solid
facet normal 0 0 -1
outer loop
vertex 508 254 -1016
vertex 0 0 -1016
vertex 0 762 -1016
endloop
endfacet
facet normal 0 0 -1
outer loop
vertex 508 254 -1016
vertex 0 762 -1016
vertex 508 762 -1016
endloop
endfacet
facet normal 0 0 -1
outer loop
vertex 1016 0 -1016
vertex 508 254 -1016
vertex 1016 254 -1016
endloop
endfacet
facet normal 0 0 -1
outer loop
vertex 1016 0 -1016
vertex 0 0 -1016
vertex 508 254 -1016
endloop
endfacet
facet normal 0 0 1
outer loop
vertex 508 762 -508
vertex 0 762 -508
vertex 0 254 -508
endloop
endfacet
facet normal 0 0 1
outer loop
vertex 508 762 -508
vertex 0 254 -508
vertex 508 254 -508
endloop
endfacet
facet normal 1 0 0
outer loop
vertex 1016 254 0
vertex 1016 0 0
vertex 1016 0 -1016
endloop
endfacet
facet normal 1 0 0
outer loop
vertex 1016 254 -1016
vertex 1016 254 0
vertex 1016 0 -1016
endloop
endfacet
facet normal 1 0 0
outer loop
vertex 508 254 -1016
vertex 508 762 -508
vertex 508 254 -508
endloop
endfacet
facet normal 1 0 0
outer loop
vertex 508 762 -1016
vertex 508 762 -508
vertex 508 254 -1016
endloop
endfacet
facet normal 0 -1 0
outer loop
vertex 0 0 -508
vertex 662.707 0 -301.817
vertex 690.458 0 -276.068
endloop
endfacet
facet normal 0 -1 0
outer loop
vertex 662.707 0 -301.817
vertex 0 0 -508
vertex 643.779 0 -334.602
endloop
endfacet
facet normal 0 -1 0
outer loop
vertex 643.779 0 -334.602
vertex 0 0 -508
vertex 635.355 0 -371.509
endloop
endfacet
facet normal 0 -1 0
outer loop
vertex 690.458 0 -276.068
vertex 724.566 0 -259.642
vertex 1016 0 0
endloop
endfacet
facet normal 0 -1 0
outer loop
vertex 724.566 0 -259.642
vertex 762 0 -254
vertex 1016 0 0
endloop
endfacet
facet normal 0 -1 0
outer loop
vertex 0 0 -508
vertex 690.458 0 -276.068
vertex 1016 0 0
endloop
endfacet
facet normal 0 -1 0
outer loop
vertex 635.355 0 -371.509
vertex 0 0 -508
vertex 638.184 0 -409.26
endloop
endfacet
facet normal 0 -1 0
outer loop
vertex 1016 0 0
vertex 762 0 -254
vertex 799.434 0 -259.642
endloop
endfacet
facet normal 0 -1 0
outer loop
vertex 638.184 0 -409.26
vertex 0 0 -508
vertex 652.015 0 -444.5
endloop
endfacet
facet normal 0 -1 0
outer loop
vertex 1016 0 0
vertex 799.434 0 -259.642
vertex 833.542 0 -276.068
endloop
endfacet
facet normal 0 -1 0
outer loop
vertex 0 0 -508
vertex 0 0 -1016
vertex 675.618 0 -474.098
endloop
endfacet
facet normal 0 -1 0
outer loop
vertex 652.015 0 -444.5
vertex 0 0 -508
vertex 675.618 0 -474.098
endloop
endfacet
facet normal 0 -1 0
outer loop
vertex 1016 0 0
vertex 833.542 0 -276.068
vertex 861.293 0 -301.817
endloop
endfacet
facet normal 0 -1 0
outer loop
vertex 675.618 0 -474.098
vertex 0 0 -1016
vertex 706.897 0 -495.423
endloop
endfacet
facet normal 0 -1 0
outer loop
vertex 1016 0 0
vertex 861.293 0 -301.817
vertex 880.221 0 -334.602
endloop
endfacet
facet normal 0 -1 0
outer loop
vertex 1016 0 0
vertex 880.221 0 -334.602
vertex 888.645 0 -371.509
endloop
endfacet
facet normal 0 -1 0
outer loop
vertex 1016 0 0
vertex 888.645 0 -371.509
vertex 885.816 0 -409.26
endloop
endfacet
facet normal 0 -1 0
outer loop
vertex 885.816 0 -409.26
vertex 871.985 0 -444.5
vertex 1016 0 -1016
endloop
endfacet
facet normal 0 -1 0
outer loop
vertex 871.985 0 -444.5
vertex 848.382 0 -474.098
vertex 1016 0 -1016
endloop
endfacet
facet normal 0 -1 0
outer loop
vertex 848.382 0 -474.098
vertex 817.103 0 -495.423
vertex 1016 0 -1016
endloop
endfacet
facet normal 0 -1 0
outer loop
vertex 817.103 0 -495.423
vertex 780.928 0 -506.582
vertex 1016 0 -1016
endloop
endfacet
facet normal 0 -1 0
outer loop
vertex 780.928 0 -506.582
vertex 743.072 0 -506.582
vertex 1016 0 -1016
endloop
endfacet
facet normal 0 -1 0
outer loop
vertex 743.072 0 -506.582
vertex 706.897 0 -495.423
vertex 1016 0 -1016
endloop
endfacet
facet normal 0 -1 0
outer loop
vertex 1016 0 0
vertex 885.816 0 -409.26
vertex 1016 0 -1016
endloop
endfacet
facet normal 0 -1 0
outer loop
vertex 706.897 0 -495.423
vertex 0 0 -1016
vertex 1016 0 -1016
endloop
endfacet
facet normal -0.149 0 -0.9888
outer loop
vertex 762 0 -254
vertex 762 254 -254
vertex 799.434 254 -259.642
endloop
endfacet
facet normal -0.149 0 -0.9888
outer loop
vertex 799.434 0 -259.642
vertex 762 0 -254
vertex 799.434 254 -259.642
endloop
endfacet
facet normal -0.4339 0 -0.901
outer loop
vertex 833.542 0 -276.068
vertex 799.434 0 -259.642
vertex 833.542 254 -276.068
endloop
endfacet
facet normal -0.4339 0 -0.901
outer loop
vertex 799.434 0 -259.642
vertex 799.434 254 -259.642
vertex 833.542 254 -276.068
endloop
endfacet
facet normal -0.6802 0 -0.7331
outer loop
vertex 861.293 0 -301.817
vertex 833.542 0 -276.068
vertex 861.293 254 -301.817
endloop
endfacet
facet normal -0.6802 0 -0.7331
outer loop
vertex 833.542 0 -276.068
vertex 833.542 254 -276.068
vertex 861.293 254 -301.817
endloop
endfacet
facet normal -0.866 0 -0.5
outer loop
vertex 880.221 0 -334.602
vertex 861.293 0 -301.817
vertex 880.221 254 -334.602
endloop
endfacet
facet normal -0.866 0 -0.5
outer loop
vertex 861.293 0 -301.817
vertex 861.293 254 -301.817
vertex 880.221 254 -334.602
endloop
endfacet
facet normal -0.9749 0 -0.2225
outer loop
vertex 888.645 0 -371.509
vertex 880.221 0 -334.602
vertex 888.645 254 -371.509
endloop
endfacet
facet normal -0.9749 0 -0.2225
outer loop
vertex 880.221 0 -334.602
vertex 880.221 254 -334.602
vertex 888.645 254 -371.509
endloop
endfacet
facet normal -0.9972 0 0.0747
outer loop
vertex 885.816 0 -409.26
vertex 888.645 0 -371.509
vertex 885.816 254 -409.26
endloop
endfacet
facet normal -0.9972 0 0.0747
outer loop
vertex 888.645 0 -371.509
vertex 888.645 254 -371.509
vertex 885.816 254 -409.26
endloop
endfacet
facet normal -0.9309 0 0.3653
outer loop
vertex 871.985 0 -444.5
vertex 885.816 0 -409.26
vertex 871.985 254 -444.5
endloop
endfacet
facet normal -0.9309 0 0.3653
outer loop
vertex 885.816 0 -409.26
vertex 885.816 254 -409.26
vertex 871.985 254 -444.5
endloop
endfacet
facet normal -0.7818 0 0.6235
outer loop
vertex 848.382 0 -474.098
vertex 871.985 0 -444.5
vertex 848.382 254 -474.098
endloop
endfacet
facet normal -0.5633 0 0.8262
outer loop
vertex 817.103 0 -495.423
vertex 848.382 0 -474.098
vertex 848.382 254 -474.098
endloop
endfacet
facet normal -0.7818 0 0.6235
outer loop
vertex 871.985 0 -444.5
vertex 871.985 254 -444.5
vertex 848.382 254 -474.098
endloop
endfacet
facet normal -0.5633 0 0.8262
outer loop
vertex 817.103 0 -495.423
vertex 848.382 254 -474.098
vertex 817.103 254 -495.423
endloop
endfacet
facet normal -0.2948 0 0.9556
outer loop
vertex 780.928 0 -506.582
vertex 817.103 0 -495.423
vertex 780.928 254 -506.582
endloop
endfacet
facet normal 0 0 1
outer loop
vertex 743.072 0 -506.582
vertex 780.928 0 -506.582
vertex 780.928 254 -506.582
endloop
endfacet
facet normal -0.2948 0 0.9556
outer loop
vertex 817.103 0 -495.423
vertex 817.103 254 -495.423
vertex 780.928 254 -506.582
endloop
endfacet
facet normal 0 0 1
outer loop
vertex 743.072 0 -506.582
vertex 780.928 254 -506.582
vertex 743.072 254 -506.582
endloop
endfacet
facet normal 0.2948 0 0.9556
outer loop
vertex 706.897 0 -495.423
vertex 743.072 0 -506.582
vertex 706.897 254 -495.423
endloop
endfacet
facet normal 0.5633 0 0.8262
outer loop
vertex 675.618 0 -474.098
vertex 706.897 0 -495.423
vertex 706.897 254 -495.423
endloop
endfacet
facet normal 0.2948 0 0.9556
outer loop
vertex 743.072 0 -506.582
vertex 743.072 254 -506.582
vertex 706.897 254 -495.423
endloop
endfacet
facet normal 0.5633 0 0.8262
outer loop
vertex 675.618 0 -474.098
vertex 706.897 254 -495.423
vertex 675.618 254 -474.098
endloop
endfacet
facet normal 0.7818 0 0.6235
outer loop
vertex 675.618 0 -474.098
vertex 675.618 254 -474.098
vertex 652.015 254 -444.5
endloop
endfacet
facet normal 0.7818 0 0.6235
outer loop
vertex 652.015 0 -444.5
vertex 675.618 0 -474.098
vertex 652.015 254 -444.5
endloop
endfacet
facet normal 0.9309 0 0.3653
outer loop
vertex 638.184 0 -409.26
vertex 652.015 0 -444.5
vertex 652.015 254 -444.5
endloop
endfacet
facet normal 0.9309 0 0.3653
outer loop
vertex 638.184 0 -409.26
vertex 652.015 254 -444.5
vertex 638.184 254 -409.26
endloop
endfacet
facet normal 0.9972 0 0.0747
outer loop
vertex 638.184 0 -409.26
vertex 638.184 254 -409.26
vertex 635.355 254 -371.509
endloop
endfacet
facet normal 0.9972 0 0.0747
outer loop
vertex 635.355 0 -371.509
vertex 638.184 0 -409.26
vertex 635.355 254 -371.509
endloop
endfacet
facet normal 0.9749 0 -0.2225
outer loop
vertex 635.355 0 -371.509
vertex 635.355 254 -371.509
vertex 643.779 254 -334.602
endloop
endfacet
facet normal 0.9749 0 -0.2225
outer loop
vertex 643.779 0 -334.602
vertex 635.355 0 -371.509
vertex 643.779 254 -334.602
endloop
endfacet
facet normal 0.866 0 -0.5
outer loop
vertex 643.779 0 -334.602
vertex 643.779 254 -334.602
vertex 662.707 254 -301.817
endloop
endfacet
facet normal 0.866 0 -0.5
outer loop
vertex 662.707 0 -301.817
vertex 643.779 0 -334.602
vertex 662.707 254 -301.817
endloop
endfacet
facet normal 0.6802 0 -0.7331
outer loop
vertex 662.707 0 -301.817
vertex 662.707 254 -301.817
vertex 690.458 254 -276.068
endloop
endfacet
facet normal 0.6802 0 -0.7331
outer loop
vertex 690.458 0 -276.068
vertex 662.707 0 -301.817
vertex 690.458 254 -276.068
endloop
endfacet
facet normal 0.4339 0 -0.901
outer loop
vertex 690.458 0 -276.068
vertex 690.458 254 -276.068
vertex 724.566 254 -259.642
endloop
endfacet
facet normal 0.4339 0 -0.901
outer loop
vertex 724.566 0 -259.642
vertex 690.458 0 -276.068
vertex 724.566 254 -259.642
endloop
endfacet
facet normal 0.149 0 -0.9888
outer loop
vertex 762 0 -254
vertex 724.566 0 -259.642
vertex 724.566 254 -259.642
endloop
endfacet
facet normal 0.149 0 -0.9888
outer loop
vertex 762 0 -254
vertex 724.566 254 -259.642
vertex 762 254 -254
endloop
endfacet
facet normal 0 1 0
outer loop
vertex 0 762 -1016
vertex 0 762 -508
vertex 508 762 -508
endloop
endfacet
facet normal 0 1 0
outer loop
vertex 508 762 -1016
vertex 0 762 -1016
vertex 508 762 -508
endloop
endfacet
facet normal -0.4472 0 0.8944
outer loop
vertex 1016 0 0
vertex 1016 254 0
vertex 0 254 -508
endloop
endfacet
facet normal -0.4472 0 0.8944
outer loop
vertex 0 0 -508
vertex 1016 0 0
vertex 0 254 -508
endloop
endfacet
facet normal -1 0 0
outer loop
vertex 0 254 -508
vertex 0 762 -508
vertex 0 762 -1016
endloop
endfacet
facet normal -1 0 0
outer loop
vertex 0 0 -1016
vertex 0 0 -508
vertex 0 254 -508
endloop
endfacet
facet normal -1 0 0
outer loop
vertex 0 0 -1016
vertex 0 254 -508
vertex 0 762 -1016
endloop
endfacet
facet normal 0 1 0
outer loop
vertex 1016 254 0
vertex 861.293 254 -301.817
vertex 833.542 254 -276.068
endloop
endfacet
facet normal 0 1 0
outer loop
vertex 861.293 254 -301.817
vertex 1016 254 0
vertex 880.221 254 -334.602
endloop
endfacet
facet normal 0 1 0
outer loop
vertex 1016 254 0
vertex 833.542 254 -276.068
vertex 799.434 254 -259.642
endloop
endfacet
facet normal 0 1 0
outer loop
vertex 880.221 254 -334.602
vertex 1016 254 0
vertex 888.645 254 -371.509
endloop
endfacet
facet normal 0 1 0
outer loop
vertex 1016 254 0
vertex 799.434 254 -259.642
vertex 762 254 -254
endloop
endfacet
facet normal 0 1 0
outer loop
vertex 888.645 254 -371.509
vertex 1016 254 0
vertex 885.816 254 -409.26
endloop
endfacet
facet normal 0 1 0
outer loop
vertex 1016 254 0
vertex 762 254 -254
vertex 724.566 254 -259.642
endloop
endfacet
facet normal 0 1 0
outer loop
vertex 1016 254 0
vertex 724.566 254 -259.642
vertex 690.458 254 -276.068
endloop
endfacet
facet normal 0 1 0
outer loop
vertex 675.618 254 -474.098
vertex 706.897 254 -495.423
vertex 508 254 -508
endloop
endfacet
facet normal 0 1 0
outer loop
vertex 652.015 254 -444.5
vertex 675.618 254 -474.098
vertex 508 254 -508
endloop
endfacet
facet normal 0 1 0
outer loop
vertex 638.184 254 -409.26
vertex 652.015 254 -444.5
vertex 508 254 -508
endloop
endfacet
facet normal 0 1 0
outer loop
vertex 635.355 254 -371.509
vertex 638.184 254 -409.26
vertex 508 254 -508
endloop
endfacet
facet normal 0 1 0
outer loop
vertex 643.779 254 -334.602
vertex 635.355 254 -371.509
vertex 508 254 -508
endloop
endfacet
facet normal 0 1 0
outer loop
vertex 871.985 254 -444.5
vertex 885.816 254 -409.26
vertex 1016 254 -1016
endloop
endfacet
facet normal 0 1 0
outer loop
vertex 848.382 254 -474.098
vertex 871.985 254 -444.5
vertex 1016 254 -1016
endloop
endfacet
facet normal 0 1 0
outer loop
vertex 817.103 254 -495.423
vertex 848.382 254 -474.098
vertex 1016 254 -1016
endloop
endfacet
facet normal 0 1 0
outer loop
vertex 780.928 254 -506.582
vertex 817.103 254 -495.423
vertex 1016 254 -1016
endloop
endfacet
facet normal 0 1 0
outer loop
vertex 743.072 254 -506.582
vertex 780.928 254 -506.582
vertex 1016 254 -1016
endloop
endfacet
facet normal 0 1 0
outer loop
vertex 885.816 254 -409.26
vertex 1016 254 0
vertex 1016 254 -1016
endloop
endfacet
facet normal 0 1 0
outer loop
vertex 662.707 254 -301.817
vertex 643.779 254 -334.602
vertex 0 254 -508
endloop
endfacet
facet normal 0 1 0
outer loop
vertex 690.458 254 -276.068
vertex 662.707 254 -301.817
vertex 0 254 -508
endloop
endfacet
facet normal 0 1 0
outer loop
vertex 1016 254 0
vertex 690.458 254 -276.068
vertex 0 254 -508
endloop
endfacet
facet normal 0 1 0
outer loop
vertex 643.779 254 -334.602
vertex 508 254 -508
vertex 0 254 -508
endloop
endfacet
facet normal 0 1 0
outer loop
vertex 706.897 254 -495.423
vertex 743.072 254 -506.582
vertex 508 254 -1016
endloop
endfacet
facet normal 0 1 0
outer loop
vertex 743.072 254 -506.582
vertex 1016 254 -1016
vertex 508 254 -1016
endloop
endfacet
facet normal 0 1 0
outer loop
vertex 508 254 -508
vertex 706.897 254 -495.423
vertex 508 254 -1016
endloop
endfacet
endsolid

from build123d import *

# Parameters (mm, degrees)
SKETCH1_W           = 1016
SKETCH1_H           = 1016
BOSS_EXTRUDE1_DEPTH = 1016
CUT_EXTRUDE1_DEPTH  = 1016
CUT_EXTRUDE2_DEPTH  = 762
SKETCH4_W           = 508
SKETCH4_H           = 254
CUT_EXTRUDE3_DEPTH  = 762
SKETCH5_R           = 127
CUT_EXTRUDE4_DEPTH  = 762


with BuildPart() as part:
    # Sketch1 → Boss-Extrude1 (new body)
    with BuildSketch(Plane(origin=(0, 0, 0), x_dir=(1, 0, 0), z_dir=(0, 1, 0))):
        with Locations((508, 508)):
            Rectangle(SKETCH1_W, SKETCH1_H)
    extrude(amount=BOSS_EXTRUDE1_DEPTH)

    # Sketch2 → Cut-Extrude1 (cut)
    with BuildSketch(Plane(origin=(0, 1016, 0), x_dir=(1, 0, 0), z_dir=(0, 1, 0))):
        Polygon((0, 0), (1016, 0), (0, 508), align=None)
    extrude(amount=-CUT_EXTRUDE1_DEPTH, mode=Mode.SUBTRACT)

    # Sketch3 → Cut-Extrude2 (cut)
    with BuildSketch(Plane(origin=(0, 1016, 0), x_dir=(1, 0, 0), z_dir=(0, 1, 0))):
        Polygon((0, 508), (508, 508), (508, 1016), (1016, 1016), (1016, 0), align=None)
    extrude(amount=-CUT_EXTRUDE2_DEPTH, mode=Mode.SUBTRACT)

    # Sketch4 → Cut-Extrude3 (cut)
    with BuildSketch(Plane.XY.offset(-508)):
        with Locations((254, 889)):
            Rectangle(SKETCH4_W, SKETCH4_H)
    extrude(amount=-CUT_EXTRUDE3_DEPTH, mode=Mode.SUBTRACT)

    # Sketch5 → Cut-Extrude4 (cut)
    with BuildSketch(Plane(origin=(0, 254, 0), x_dir=(1, 0, 0), z_dir=(0, 1, 0))):
        with Locations(Location((762, 381, 0), (0, 0, 270))):
            Circle(SKETCH5_R)
    extrude(amount=-CUT_EXTRUDE4_DEPTH, mode=Mode.SUBTRACT)


solid = part.part
